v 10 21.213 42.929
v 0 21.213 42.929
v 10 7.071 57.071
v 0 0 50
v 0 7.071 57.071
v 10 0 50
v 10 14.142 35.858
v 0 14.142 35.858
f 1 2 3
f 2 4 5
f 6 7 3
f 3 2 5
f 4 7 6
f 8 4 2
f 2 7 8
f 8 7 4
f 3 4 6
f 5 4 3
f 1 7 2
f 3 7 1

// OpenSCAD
$fa = 1;
$fs = 0.4;
$fn = 100;

pipe_thickness = 30.00;

pipe_attachement_thickness = 8.00;
pipe_attachement_height = 30.00;

ear_x = 30;
ear_y = 15;
ear_z = 20;

height = 50.00;
length = 80.00;

module pipe_solid_angle()
{
    hull() {
//cylinder(d=pipe_attachement_thickness+pipe_thickness, h=pipe_attachement_height, center=true);
#translate([0, 0, 50]) rotate([-45, 0, 0]) cube([10, 20, 10]);
    }
}


module pipe_solid()
{
    hull() {
        cylinder(d=pipe_attachement_thickness+pipe_thickness, h=pipe_attachement_height, center=true);
        translate([(pipe_attachement_thickness+pipe_thickness)/2, 0, 0]) cube([ear_x, ear_y, ear_z], center=true);
        translate([(-pipe_attachement_thickness+pipe_thickness)/2-ear_x, 0, 0]) cube([ear_x, ear_y, ear_z], center=true);
    }
}

module pipe_holder()
{
    difference()
    {
        pipe_solid();
        cylinder(d=pipe_thickness, h=pipe_attachement_height*2, center=true);
    }
}

//pipe_holder();
//pipe_solid();
pipe_solid_angle();
